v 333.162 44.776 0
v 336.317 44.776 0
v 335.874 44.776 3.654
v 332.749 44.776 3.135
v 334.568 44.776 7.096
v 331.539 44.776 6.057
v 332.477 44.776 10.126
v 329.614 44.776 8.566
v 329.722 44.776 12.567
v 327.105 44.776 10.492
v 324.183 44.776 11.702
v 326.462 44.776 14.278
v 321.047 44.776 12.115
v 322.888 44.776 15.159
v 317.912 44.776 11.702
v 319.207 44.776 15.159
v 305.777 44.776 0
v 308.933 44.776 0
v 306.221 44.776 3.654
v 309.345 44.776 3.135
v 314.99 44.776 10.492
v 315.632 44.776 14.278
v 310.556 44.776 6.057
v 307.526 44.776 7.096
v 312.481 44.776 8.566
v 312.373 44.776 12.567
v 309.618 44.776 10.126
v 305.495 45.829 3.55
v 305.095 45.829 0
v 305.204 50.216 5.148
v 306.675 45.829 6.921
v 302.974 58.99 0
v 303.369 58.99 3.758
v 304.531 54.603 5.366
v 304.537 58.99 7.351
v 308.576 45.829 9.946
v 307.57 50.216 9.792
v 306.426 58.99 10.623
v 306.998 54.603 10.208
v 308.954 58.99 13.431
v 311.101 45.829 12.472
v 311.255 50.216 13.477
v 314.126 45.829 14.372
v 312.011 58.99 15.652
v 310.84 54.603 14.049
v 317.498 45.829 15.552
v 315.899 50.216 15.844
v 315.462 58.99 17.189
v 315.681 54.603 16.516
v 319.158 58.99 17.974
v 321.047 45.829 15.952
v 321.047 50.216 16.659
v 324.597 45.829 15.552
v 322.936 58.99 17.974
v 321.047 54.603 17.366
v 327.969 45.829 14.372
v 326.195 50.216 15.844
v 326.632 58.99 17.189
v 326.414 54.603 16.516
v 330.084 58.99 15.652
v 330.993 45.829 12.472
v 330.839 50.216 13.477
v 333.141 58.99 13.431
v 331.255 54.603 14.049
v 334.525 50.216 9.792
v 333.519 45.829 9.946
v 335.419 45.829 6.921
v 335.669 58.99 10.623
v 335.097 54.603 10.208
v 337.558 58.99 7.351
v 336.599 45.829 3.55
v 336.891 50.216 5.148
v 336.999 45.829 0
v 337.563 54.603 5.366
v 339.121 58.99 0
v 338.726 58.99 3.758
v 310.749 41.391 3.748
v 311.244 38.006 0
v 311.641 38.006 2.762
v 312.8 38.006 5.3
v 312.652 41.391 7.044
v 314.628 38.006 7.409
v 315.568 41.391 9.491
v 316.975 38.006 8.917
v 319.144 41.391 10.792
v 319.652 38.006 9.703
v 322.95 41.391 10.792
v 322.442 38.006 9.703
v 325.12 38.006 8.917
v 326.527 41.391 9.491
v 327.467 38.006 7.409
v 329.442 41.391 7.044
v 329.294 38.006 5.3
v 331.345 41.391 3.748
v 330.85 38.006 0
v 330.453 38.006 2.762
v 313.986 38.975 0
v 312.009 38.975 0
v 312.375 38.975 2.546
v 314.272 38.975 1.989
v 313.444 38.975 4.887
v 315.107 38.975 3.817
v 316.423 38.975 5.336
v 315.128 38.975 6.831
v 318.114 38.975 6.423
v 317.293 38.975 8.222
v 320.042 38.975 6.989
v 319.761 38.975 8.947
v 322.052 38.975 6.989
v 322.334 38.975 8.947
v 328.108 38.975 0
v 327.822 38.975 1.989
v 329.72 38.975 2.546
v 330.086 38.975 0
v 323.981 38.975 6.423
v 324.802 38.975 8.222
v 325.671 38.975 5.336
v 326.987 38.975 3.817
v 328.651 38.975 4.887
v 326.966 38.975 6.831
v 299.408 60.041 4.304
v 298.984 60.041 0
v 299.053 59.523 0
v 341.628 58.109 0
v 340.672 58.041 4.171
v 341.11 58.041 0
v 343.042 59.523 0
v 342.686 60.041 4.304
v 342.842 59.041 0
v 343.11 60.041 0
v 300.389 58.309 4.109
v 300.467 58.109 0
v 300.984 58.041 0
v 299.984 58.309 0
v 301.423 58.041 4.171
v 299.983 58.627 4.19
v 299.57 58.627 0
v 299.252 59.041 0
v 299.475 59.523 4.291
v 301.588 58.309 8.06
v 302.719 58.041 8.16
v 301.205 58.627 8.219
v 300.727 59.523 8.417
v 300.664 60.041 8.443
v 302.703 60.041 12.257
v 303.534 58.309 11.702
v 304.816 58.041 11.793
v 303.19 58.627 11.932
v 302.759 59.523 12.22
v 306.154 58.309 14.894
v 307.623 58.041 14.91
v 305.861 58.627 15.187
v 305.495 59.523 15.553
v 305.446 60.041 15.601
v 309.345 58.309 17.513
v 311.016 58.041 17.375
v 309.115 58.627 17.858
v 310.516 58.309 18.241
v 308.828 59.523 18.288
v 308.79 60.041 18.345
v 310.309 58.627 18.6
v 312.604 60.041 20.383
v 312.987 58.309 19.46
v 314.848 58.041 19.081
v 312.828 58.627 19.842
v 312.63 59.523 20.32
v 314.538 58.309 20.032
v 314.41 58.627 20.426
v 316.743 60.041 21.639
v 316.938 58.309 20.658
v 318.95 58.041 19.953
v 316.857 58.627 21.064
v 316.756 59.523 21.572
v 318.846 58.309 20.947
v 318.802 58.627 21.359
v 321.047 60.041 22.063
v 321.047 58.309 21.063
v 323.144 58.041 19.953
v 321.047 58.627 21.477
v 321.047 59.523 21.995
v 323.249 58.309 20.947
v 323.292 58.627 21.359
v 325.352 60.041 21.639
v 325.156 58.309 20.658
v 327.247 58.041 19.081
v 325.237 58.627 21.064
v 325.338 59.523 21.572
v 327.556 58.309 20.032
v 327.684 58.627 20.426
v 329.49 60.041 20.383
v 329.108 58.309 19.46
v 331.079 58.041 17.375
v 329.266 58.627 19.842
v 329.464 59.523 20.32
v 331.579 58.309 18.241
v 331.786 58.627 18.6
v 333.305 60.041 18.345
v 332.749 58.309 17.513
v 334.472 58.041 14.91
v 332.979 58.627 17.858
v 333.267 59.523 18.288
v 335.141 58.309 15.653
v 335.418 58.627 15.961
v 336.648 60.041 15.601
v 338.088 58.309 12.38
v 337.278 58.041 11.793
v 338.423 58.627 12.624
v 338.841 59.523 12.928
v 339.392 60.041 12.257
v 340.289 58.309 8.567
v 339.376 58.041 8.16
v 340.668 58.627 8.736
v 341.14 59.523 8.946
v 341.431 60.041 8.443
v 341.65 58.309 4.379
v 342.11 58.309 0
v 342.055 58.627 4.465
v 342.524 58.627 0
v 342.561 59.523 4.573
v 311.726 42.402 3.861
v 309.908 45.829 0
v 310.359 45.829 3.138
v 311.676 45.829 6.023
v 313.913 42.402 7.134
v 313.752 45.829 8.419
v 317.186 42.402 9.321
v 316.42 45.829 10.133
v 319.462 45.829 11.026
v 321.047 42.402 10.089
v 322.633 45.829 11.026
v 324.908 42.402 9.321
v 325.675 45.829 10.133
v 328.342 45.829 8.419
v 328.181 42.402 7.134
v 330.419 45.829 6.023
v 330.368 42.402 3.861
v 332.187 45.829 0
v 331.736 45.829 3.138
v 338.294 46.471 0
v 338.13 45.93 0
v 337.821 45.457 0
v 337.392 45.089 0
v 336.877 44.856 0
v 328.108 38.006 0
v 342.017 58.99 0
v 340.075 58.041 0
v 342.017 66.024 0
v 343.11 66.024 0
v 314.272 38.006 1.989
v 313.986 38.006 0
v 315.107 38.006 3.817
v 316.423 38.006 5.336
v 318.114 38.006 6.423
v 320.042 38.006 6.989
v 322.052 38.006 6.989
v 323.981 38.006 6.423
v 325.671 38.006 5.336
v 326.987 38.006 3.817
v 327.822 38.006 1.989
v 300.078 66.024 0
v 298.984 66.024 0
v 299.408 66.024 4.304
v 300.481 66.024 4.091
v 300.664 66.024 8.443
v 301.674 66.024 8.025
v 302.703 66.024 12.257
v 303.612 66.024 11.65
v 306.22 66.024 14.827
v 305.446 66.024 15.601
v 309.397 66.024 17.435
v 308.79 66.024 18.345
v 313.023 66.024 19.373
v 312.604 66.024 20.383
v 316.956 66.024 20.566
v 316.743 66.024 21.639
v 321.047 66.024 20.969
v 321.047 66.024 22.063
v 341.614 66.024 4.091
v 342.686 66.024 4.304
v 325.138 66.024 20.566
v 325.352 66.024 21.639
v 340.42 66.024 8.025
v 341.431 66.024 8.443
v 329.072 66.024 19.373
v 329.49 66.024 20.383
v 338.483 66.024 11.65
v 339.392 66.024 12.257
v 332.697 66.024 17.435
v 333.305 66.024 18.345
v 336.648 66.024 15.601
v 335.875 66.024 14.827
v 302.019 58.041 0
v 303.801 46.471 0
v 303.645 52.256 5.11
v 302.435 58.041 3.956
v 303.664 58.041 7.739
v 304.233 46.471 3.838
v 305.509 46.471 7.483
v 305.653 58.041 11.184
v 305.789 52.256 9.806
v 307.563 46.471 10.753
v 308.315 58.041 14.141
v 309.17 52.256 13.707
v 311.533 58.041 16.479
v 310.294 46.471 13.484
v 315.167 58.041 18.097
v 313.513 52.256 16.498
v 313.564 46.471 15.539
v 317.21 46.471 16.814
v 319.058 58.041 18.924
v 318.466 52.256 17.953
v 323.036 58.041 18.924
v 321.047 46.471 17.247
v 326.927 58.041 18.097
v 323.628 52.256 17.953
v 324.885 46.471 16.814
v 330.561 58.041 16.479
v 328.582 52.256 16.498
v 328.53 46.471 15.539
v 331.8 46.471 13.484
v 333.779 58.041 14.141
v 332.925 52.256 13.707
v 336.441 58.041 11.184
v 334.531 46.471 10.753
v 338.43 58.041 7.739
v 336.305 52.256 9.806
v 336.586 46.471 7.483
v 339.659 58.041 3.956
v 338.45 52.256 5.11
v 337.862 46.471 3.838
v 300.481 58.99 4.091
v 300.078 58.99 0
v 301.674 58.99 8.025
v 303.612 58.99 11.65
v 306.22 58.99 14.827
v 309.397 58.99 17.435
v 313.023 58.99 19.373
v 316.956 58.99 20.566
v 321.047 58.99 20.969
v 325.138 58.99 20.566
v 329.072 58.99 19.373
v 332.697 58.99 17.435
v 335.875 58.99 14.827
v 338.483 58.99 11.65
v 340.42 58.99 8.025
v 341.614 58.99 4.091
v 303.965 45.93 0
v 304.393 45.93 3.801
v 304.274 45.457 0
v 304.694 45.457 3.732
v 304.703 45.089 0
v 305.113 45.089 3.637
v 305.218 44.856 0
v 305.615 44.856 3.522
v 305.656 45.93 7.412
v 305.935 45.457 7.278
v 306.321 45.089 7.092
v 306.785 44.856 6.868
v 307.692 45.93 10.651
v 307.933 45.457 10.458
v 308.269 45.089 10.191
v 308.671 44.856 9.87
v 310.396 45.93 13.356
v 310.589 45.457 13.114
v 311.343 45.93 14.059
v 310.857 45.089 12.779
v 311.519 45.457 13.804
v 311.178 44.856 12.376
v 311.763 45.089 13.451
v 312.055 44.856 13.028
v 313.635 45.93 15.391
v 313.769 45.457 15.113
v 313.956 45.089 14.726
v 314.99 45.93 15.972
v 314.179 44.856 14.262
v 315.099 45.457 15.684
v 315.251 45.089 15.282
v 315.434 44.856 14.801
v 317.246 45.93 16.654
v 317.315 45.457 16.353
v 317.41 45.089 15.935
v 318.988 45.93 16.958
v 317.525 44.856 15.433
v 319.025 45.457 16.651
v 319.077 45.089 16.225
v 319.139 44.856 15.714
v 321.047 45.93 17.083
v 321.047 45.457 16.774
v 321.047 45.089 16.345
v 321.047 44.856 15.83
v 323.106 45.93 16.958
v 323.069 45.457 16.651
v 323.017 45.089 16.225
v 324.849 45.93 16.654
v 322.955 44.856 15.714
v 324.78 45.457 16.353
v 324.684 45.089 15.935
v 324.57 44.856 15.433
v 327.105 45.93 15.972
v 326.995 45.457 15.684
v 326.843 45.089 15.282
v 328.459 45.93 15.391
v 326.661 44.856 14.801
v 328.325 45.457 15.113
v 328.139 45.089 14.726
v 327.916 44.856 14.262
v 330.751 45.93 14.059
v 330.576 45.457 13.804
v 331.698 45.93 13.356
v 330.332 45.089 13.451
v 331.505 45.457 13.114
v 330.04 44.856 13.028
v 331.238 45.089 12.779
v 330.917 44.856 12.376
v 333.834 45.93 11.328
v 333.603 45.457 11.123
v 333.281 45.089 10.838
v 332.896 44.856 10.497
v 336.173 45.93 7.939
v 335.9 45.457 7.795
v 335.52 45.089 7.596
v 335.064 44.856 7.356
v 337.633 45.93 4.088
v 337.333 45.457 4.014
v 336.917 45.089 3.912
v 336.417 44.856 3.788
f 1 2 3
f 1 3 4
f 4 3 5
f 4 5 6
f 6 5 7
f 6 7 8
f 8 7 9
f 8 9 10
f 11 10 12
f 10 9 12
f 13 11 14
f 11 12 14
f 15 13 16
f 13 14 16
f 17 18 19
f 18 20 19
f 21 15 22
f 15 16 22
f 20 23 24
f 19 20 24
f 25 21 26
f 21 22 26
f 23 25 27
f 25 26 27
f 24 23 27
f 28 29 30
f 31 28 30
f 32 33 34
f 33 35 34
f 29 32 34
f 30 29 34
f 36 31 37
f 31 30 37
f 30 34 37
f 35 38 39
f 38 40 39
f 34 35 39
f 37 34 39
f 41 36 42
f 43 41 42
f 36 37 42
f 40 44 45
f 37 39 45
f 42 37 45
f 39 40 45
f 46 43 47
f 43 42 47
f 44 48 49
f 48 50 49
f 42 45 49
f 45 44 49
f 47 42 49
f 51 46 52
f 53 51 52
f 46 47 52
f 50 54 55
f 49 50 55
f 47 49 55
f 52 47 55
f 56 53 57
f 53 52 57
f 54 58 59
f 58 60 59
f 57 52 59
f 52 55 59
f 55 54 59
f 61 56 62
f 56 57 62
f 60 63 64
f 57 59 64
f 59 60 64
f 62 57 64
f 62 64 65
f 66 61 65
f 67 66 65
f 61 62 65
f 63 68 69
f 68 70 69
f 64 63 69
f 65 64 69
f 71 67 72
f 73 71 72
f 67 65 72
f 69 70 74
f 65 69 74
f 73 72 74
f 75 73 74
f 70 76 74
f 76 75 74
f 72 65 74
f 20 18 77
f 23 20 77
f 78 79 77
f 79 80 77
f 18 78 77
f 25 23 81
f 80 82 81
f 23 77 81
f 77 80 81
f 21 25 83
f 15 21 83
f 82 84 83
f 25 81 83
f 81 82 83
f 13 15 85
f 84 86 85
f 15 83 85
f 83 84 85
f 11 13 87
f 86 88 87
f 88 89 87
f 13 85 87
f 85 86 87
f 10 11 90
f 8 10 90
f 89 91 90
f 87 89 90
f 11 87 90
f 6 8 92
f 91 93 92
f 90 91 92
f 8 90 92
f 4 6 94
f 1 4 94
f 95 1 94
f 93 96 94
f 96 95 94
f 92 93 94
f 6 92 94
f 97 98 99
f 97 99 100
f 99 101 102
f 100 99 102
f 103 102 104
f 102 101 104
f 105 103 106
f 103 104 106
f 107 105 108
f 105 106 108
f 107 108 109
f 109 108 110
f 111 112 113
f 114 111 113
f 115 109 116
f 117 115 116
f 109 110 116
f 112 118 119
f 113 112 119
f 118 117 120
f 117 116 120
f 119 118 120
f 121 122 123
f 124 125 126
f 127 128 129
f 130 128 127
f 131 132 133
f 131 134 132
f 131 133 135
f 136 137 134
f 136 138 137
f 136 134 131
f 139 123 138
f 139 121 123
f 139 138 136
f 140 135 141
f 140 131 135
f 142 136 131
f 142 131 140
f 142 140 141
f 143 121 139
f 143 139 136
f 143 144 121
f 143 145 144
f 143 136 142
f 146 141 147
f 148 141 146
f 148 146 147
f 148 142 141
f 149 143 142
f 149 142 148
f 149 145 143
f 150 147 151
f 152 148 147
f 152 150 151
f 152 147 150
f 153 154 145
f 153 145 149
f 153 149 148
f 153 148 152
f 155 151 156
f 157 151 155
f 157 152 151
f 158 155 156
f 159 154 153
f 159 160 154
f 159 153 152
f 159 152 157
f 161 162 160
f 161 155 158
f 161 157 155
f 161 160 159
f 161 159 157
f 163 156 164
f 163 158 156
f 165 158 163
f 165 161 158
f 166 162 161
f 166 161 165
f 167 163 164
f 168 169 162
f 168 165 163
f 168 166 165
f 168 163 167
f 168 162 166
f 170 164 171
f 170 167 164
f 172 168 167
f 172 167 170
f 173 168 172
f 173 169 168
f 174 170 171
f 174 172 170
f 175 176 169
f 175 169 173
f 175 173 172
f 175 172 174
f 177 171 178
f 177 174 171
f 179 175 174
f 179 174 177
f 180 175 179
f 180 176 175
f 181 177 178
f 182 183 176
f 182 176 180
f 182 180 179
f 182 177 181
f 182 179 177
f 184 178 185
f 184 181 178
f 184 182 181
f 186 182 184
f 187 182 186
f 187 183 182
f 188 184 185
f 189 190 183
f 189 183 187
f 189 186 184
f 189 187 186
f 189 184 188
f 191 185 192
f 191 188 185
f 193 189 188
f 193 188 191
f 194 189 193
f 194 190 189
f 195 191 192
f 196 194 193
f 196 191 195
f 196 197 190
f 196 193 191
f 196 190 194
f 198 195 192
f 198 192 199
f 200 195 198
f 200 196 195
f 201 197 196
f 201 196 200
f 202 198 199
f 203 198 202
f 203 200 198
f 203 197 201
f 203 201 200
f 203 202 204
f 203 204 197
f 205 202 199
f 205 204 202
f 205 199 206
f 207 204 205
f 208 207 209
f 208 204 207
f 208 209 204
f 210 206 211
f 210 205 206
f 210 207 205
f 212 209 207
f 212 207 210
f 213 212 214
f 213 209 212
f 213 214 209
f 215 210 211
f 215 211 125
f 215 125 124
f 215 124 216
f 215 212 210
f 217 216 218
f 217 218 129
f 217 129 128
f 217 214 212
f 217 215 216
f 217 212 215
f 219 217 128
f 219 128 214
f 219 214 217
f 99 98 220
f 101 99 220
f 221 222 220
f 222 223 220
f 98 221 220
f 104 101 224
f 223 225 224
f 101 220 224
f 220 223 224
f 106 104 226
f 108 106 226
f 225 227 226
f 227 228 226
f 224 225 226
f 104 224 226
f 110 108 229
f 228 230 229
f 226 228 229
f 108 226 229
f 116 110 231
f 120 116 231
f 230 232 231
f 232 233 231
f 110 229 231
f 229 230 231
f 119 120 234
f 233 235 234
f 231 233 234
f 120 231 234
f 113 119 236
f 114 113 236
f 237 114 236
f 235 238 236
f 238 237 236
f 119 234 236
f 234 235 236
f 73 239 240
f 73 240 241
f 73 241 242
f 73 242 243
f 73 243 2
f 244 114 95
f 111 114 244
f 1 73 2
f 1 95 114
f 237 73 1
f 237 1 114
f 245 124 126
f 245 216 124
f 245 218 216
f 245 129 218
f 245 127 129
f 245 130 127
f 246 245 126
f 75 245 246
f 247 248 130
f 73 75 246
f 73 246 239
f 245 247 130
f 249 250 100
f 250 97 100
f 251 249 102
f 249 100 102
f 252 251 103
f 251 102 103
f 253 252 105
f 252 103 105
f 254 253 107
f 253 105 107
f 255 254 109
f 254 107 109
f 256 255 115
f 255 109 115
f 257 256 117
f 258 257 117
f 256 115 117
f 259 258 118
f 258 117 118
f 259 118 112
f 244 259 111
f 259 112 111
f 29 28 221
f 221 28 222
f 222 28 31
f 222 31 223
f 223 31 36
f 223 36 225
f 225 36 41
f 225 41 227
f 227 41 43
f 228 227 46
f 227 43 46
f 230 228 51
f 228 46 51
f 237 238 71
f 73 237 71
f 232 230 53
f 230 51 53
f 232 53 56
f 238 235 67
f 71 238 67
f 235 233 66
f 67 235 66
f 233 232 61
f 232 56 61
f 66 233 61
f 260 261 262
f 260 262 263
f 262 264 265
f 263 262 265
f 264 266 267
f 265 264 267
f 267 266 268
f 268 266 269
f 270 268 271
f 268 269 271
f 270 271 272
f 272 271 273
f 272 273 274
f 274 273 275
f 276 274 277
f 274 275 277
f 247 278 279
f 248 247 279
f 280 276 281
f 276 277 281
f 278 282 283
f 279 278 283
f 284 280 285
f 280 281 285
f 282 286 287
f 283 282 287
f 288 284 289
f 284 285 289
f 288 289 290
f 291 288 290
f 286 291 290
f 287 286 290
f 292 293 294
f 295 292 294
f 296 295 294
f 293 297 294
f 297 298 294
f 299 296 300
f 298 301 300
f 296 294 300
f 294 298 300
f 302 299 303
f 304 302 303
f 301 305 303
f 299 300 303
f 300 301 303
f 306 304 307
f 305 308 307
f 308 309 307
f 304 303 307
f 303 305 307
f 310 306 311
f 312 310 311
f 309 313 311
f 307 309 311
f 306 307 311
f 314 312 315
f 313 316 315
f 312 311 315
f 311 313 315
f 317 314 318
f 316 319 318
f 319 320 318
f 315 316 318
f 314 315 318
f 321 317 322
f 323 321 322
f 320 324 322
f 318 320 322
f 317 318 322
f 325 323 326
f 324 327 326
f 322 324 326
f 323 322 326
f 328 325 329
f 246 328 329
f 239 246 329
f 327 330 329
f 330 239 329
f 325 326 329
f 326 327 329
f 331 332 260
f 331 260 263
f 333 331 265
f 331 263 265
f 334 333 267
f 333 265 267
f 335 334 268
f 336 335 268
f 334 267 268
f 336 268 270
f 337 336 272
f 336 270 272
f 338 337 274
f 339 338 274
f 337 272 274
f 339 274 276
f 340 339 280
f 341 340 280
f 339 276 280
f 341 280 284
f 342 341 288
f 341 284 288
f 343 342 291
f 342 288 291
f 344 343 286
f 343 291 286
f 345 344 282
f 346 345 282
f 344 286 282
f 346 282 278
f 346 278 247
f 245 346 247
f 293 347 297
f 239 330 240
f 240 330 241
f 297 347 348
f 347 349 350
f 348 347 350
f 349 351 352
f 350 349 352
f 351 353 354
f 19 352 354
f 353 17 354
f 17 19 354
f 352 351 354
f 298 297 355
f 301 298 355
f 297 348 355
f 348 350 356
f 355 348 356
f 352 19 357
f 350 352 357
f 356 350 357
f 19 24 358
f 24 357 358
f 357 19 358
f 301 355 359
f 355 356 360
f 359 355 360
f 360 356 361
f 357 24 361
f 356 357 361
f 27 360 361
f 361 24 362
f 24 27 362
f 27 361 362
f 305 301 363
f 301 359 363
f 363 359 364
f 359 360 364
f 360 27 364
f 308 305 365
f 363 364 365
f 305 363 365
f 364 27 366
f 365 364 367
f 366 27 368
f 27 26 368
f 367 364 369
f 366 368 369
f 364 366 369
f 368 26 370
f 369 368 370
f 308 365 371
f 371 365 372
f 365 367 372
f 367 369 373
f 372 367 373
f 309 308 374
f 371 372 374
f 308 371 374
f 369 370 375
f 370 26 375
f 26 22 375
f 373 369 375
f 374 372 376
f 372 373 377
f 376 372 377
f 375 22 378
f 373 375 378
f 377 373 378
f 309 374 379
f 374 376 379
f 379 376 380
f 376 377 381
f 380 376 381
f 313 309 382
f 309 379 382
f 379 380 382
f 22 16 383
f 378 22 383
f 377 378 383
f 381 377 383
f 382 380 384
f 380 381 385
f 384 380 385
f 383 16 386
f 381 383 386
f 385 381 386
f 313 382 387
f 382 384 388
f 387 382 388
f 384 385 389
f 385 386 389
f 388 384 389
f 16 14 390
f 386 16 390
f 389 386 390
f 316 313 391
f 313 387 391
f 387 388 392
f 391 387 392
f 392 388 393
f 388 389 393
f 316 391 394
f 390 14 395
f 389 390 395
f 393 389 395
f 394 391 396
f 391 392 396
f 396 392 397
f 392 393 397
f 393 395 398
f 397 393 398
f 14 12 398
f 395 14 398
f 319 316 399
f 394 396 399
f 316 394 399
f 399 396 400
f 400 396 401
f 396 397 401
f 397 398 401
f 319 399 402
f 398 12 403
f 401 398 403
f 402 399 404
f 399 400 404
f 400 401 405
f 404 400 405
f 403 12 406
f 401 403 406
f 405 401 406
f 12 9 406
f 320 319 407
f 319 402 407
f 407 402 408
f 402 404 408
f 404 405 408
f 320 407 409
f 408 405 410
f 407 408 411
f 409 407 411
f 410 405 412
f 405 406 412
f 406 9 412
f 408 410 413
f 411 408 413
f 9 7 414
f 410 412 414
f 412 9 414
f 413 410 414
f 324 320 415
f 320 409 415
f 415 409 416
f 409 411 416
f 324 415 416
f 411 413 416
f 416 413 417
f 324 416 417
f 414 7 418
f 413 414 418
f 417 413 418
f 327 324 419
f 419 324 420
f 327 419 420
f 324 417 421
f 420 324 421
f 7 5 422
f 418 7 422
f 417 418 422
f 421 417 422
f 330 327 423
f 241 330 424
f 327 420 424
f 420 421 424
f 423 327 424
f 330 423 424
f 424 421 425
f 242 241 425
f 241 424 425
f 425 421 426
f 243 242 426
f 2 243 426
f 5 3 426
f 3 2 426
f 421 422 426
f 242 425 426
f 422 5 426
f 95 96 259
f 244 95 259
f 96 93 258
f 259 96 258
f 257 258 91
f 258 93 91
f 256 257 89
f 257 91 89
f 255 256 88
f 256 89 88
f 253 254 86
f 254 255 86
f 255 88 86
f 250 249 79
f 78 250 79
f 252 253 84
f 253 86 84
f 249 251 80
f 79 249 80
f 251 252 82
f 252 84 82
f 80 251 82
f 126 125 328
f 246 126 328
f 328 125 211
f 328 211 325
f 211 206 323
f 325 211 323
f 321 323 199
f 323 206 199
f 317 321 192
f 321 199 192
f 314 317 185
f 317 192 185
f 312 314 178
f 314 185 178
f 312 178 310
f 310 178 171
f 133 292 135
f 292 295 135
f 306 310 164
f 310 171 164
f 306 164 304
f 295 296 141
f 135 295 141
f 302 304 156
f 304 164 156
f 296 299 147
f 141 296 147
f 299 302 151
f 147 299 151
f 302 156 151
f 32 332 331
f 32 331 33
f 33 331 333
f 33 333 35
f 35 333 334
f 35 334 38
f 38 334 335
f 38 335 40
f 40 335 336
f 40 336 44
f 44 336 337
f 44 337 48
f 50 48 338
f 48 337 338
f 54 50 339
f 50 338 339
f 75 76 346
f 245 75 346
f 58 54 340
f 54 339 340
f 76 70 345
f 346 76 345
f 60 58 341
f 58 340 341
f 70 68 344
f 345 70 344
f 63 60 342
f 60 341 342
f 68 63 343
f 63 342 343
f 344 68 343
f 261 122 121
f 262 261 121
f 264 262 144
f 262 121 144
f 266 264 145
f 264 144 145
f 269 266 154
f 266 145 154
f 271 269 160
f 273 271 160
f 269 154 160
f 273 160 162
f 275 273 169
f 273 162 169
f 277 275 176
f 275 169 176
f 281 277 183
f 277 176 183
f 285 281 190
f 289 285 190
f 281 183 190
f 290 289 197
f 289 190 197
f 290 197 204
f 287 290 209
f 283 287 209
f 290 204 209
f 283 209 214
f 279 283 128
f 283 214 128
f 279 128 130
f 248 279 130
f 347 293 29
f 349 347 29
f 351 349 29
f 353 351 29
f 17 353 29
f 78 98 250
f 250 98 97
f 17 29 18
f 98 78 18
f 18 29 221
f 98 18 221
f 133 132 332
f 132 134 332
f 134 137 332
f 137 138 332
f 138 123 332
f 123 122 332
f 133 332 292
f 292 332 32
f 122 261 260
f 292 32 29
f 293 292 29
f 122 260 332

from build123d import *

# Parameters (mm, degrees)
REVOLVE2_ANGLE = 180
FILLET1_R      = 2
FILLET2_R      = 2


with BuildPart() as part:
    # Sketch1 → Revolve2 (revolve)
    with BuildSketch(Plane.XY):
        Polygon((298.984408478, 58.041083961), (302.019314835, 58.041083961), (304.061664281, 44.775692844), (308.932649078, 44.775692844), (311.24430288, 38.005849568), (313.986310635, 38.005849568), (313.986310635, 38.974632238), (312.008767265, 38.974632238), (309.907518568, 45.829224513), (308.932649078, 45.829224513), (305.095386851, 45.829224513), (302.974041332, 58.990397452), (300.078054647, 58.990397452), (300.078054647, 66.023507974), (298.984408478, 66.023507974), align=None)
    revolve(axis=Axis((321.047285869, 38.005849568, 0), (0, 1, 0)), revolution_arc=REVOLVE2_ANGLE)

    # Fillet1
    fillet1_edges = [part.edges().sort_by_distance(p)[0] for p in [
        (321.047285869, 58.041083961, 22.062877391),
    ]]
    fillet(fillet1_edges, radius=FILLET1_R)

    # Fillet2
    fillet2_edges = [part.edges().sort_by_distance(p)[0] for p in [
        (321.047285869, 44.775692844, 16.985621588),
    ]]
    fillet(fillet2_edges, radius=FILLET2_R)


solid = part.part
